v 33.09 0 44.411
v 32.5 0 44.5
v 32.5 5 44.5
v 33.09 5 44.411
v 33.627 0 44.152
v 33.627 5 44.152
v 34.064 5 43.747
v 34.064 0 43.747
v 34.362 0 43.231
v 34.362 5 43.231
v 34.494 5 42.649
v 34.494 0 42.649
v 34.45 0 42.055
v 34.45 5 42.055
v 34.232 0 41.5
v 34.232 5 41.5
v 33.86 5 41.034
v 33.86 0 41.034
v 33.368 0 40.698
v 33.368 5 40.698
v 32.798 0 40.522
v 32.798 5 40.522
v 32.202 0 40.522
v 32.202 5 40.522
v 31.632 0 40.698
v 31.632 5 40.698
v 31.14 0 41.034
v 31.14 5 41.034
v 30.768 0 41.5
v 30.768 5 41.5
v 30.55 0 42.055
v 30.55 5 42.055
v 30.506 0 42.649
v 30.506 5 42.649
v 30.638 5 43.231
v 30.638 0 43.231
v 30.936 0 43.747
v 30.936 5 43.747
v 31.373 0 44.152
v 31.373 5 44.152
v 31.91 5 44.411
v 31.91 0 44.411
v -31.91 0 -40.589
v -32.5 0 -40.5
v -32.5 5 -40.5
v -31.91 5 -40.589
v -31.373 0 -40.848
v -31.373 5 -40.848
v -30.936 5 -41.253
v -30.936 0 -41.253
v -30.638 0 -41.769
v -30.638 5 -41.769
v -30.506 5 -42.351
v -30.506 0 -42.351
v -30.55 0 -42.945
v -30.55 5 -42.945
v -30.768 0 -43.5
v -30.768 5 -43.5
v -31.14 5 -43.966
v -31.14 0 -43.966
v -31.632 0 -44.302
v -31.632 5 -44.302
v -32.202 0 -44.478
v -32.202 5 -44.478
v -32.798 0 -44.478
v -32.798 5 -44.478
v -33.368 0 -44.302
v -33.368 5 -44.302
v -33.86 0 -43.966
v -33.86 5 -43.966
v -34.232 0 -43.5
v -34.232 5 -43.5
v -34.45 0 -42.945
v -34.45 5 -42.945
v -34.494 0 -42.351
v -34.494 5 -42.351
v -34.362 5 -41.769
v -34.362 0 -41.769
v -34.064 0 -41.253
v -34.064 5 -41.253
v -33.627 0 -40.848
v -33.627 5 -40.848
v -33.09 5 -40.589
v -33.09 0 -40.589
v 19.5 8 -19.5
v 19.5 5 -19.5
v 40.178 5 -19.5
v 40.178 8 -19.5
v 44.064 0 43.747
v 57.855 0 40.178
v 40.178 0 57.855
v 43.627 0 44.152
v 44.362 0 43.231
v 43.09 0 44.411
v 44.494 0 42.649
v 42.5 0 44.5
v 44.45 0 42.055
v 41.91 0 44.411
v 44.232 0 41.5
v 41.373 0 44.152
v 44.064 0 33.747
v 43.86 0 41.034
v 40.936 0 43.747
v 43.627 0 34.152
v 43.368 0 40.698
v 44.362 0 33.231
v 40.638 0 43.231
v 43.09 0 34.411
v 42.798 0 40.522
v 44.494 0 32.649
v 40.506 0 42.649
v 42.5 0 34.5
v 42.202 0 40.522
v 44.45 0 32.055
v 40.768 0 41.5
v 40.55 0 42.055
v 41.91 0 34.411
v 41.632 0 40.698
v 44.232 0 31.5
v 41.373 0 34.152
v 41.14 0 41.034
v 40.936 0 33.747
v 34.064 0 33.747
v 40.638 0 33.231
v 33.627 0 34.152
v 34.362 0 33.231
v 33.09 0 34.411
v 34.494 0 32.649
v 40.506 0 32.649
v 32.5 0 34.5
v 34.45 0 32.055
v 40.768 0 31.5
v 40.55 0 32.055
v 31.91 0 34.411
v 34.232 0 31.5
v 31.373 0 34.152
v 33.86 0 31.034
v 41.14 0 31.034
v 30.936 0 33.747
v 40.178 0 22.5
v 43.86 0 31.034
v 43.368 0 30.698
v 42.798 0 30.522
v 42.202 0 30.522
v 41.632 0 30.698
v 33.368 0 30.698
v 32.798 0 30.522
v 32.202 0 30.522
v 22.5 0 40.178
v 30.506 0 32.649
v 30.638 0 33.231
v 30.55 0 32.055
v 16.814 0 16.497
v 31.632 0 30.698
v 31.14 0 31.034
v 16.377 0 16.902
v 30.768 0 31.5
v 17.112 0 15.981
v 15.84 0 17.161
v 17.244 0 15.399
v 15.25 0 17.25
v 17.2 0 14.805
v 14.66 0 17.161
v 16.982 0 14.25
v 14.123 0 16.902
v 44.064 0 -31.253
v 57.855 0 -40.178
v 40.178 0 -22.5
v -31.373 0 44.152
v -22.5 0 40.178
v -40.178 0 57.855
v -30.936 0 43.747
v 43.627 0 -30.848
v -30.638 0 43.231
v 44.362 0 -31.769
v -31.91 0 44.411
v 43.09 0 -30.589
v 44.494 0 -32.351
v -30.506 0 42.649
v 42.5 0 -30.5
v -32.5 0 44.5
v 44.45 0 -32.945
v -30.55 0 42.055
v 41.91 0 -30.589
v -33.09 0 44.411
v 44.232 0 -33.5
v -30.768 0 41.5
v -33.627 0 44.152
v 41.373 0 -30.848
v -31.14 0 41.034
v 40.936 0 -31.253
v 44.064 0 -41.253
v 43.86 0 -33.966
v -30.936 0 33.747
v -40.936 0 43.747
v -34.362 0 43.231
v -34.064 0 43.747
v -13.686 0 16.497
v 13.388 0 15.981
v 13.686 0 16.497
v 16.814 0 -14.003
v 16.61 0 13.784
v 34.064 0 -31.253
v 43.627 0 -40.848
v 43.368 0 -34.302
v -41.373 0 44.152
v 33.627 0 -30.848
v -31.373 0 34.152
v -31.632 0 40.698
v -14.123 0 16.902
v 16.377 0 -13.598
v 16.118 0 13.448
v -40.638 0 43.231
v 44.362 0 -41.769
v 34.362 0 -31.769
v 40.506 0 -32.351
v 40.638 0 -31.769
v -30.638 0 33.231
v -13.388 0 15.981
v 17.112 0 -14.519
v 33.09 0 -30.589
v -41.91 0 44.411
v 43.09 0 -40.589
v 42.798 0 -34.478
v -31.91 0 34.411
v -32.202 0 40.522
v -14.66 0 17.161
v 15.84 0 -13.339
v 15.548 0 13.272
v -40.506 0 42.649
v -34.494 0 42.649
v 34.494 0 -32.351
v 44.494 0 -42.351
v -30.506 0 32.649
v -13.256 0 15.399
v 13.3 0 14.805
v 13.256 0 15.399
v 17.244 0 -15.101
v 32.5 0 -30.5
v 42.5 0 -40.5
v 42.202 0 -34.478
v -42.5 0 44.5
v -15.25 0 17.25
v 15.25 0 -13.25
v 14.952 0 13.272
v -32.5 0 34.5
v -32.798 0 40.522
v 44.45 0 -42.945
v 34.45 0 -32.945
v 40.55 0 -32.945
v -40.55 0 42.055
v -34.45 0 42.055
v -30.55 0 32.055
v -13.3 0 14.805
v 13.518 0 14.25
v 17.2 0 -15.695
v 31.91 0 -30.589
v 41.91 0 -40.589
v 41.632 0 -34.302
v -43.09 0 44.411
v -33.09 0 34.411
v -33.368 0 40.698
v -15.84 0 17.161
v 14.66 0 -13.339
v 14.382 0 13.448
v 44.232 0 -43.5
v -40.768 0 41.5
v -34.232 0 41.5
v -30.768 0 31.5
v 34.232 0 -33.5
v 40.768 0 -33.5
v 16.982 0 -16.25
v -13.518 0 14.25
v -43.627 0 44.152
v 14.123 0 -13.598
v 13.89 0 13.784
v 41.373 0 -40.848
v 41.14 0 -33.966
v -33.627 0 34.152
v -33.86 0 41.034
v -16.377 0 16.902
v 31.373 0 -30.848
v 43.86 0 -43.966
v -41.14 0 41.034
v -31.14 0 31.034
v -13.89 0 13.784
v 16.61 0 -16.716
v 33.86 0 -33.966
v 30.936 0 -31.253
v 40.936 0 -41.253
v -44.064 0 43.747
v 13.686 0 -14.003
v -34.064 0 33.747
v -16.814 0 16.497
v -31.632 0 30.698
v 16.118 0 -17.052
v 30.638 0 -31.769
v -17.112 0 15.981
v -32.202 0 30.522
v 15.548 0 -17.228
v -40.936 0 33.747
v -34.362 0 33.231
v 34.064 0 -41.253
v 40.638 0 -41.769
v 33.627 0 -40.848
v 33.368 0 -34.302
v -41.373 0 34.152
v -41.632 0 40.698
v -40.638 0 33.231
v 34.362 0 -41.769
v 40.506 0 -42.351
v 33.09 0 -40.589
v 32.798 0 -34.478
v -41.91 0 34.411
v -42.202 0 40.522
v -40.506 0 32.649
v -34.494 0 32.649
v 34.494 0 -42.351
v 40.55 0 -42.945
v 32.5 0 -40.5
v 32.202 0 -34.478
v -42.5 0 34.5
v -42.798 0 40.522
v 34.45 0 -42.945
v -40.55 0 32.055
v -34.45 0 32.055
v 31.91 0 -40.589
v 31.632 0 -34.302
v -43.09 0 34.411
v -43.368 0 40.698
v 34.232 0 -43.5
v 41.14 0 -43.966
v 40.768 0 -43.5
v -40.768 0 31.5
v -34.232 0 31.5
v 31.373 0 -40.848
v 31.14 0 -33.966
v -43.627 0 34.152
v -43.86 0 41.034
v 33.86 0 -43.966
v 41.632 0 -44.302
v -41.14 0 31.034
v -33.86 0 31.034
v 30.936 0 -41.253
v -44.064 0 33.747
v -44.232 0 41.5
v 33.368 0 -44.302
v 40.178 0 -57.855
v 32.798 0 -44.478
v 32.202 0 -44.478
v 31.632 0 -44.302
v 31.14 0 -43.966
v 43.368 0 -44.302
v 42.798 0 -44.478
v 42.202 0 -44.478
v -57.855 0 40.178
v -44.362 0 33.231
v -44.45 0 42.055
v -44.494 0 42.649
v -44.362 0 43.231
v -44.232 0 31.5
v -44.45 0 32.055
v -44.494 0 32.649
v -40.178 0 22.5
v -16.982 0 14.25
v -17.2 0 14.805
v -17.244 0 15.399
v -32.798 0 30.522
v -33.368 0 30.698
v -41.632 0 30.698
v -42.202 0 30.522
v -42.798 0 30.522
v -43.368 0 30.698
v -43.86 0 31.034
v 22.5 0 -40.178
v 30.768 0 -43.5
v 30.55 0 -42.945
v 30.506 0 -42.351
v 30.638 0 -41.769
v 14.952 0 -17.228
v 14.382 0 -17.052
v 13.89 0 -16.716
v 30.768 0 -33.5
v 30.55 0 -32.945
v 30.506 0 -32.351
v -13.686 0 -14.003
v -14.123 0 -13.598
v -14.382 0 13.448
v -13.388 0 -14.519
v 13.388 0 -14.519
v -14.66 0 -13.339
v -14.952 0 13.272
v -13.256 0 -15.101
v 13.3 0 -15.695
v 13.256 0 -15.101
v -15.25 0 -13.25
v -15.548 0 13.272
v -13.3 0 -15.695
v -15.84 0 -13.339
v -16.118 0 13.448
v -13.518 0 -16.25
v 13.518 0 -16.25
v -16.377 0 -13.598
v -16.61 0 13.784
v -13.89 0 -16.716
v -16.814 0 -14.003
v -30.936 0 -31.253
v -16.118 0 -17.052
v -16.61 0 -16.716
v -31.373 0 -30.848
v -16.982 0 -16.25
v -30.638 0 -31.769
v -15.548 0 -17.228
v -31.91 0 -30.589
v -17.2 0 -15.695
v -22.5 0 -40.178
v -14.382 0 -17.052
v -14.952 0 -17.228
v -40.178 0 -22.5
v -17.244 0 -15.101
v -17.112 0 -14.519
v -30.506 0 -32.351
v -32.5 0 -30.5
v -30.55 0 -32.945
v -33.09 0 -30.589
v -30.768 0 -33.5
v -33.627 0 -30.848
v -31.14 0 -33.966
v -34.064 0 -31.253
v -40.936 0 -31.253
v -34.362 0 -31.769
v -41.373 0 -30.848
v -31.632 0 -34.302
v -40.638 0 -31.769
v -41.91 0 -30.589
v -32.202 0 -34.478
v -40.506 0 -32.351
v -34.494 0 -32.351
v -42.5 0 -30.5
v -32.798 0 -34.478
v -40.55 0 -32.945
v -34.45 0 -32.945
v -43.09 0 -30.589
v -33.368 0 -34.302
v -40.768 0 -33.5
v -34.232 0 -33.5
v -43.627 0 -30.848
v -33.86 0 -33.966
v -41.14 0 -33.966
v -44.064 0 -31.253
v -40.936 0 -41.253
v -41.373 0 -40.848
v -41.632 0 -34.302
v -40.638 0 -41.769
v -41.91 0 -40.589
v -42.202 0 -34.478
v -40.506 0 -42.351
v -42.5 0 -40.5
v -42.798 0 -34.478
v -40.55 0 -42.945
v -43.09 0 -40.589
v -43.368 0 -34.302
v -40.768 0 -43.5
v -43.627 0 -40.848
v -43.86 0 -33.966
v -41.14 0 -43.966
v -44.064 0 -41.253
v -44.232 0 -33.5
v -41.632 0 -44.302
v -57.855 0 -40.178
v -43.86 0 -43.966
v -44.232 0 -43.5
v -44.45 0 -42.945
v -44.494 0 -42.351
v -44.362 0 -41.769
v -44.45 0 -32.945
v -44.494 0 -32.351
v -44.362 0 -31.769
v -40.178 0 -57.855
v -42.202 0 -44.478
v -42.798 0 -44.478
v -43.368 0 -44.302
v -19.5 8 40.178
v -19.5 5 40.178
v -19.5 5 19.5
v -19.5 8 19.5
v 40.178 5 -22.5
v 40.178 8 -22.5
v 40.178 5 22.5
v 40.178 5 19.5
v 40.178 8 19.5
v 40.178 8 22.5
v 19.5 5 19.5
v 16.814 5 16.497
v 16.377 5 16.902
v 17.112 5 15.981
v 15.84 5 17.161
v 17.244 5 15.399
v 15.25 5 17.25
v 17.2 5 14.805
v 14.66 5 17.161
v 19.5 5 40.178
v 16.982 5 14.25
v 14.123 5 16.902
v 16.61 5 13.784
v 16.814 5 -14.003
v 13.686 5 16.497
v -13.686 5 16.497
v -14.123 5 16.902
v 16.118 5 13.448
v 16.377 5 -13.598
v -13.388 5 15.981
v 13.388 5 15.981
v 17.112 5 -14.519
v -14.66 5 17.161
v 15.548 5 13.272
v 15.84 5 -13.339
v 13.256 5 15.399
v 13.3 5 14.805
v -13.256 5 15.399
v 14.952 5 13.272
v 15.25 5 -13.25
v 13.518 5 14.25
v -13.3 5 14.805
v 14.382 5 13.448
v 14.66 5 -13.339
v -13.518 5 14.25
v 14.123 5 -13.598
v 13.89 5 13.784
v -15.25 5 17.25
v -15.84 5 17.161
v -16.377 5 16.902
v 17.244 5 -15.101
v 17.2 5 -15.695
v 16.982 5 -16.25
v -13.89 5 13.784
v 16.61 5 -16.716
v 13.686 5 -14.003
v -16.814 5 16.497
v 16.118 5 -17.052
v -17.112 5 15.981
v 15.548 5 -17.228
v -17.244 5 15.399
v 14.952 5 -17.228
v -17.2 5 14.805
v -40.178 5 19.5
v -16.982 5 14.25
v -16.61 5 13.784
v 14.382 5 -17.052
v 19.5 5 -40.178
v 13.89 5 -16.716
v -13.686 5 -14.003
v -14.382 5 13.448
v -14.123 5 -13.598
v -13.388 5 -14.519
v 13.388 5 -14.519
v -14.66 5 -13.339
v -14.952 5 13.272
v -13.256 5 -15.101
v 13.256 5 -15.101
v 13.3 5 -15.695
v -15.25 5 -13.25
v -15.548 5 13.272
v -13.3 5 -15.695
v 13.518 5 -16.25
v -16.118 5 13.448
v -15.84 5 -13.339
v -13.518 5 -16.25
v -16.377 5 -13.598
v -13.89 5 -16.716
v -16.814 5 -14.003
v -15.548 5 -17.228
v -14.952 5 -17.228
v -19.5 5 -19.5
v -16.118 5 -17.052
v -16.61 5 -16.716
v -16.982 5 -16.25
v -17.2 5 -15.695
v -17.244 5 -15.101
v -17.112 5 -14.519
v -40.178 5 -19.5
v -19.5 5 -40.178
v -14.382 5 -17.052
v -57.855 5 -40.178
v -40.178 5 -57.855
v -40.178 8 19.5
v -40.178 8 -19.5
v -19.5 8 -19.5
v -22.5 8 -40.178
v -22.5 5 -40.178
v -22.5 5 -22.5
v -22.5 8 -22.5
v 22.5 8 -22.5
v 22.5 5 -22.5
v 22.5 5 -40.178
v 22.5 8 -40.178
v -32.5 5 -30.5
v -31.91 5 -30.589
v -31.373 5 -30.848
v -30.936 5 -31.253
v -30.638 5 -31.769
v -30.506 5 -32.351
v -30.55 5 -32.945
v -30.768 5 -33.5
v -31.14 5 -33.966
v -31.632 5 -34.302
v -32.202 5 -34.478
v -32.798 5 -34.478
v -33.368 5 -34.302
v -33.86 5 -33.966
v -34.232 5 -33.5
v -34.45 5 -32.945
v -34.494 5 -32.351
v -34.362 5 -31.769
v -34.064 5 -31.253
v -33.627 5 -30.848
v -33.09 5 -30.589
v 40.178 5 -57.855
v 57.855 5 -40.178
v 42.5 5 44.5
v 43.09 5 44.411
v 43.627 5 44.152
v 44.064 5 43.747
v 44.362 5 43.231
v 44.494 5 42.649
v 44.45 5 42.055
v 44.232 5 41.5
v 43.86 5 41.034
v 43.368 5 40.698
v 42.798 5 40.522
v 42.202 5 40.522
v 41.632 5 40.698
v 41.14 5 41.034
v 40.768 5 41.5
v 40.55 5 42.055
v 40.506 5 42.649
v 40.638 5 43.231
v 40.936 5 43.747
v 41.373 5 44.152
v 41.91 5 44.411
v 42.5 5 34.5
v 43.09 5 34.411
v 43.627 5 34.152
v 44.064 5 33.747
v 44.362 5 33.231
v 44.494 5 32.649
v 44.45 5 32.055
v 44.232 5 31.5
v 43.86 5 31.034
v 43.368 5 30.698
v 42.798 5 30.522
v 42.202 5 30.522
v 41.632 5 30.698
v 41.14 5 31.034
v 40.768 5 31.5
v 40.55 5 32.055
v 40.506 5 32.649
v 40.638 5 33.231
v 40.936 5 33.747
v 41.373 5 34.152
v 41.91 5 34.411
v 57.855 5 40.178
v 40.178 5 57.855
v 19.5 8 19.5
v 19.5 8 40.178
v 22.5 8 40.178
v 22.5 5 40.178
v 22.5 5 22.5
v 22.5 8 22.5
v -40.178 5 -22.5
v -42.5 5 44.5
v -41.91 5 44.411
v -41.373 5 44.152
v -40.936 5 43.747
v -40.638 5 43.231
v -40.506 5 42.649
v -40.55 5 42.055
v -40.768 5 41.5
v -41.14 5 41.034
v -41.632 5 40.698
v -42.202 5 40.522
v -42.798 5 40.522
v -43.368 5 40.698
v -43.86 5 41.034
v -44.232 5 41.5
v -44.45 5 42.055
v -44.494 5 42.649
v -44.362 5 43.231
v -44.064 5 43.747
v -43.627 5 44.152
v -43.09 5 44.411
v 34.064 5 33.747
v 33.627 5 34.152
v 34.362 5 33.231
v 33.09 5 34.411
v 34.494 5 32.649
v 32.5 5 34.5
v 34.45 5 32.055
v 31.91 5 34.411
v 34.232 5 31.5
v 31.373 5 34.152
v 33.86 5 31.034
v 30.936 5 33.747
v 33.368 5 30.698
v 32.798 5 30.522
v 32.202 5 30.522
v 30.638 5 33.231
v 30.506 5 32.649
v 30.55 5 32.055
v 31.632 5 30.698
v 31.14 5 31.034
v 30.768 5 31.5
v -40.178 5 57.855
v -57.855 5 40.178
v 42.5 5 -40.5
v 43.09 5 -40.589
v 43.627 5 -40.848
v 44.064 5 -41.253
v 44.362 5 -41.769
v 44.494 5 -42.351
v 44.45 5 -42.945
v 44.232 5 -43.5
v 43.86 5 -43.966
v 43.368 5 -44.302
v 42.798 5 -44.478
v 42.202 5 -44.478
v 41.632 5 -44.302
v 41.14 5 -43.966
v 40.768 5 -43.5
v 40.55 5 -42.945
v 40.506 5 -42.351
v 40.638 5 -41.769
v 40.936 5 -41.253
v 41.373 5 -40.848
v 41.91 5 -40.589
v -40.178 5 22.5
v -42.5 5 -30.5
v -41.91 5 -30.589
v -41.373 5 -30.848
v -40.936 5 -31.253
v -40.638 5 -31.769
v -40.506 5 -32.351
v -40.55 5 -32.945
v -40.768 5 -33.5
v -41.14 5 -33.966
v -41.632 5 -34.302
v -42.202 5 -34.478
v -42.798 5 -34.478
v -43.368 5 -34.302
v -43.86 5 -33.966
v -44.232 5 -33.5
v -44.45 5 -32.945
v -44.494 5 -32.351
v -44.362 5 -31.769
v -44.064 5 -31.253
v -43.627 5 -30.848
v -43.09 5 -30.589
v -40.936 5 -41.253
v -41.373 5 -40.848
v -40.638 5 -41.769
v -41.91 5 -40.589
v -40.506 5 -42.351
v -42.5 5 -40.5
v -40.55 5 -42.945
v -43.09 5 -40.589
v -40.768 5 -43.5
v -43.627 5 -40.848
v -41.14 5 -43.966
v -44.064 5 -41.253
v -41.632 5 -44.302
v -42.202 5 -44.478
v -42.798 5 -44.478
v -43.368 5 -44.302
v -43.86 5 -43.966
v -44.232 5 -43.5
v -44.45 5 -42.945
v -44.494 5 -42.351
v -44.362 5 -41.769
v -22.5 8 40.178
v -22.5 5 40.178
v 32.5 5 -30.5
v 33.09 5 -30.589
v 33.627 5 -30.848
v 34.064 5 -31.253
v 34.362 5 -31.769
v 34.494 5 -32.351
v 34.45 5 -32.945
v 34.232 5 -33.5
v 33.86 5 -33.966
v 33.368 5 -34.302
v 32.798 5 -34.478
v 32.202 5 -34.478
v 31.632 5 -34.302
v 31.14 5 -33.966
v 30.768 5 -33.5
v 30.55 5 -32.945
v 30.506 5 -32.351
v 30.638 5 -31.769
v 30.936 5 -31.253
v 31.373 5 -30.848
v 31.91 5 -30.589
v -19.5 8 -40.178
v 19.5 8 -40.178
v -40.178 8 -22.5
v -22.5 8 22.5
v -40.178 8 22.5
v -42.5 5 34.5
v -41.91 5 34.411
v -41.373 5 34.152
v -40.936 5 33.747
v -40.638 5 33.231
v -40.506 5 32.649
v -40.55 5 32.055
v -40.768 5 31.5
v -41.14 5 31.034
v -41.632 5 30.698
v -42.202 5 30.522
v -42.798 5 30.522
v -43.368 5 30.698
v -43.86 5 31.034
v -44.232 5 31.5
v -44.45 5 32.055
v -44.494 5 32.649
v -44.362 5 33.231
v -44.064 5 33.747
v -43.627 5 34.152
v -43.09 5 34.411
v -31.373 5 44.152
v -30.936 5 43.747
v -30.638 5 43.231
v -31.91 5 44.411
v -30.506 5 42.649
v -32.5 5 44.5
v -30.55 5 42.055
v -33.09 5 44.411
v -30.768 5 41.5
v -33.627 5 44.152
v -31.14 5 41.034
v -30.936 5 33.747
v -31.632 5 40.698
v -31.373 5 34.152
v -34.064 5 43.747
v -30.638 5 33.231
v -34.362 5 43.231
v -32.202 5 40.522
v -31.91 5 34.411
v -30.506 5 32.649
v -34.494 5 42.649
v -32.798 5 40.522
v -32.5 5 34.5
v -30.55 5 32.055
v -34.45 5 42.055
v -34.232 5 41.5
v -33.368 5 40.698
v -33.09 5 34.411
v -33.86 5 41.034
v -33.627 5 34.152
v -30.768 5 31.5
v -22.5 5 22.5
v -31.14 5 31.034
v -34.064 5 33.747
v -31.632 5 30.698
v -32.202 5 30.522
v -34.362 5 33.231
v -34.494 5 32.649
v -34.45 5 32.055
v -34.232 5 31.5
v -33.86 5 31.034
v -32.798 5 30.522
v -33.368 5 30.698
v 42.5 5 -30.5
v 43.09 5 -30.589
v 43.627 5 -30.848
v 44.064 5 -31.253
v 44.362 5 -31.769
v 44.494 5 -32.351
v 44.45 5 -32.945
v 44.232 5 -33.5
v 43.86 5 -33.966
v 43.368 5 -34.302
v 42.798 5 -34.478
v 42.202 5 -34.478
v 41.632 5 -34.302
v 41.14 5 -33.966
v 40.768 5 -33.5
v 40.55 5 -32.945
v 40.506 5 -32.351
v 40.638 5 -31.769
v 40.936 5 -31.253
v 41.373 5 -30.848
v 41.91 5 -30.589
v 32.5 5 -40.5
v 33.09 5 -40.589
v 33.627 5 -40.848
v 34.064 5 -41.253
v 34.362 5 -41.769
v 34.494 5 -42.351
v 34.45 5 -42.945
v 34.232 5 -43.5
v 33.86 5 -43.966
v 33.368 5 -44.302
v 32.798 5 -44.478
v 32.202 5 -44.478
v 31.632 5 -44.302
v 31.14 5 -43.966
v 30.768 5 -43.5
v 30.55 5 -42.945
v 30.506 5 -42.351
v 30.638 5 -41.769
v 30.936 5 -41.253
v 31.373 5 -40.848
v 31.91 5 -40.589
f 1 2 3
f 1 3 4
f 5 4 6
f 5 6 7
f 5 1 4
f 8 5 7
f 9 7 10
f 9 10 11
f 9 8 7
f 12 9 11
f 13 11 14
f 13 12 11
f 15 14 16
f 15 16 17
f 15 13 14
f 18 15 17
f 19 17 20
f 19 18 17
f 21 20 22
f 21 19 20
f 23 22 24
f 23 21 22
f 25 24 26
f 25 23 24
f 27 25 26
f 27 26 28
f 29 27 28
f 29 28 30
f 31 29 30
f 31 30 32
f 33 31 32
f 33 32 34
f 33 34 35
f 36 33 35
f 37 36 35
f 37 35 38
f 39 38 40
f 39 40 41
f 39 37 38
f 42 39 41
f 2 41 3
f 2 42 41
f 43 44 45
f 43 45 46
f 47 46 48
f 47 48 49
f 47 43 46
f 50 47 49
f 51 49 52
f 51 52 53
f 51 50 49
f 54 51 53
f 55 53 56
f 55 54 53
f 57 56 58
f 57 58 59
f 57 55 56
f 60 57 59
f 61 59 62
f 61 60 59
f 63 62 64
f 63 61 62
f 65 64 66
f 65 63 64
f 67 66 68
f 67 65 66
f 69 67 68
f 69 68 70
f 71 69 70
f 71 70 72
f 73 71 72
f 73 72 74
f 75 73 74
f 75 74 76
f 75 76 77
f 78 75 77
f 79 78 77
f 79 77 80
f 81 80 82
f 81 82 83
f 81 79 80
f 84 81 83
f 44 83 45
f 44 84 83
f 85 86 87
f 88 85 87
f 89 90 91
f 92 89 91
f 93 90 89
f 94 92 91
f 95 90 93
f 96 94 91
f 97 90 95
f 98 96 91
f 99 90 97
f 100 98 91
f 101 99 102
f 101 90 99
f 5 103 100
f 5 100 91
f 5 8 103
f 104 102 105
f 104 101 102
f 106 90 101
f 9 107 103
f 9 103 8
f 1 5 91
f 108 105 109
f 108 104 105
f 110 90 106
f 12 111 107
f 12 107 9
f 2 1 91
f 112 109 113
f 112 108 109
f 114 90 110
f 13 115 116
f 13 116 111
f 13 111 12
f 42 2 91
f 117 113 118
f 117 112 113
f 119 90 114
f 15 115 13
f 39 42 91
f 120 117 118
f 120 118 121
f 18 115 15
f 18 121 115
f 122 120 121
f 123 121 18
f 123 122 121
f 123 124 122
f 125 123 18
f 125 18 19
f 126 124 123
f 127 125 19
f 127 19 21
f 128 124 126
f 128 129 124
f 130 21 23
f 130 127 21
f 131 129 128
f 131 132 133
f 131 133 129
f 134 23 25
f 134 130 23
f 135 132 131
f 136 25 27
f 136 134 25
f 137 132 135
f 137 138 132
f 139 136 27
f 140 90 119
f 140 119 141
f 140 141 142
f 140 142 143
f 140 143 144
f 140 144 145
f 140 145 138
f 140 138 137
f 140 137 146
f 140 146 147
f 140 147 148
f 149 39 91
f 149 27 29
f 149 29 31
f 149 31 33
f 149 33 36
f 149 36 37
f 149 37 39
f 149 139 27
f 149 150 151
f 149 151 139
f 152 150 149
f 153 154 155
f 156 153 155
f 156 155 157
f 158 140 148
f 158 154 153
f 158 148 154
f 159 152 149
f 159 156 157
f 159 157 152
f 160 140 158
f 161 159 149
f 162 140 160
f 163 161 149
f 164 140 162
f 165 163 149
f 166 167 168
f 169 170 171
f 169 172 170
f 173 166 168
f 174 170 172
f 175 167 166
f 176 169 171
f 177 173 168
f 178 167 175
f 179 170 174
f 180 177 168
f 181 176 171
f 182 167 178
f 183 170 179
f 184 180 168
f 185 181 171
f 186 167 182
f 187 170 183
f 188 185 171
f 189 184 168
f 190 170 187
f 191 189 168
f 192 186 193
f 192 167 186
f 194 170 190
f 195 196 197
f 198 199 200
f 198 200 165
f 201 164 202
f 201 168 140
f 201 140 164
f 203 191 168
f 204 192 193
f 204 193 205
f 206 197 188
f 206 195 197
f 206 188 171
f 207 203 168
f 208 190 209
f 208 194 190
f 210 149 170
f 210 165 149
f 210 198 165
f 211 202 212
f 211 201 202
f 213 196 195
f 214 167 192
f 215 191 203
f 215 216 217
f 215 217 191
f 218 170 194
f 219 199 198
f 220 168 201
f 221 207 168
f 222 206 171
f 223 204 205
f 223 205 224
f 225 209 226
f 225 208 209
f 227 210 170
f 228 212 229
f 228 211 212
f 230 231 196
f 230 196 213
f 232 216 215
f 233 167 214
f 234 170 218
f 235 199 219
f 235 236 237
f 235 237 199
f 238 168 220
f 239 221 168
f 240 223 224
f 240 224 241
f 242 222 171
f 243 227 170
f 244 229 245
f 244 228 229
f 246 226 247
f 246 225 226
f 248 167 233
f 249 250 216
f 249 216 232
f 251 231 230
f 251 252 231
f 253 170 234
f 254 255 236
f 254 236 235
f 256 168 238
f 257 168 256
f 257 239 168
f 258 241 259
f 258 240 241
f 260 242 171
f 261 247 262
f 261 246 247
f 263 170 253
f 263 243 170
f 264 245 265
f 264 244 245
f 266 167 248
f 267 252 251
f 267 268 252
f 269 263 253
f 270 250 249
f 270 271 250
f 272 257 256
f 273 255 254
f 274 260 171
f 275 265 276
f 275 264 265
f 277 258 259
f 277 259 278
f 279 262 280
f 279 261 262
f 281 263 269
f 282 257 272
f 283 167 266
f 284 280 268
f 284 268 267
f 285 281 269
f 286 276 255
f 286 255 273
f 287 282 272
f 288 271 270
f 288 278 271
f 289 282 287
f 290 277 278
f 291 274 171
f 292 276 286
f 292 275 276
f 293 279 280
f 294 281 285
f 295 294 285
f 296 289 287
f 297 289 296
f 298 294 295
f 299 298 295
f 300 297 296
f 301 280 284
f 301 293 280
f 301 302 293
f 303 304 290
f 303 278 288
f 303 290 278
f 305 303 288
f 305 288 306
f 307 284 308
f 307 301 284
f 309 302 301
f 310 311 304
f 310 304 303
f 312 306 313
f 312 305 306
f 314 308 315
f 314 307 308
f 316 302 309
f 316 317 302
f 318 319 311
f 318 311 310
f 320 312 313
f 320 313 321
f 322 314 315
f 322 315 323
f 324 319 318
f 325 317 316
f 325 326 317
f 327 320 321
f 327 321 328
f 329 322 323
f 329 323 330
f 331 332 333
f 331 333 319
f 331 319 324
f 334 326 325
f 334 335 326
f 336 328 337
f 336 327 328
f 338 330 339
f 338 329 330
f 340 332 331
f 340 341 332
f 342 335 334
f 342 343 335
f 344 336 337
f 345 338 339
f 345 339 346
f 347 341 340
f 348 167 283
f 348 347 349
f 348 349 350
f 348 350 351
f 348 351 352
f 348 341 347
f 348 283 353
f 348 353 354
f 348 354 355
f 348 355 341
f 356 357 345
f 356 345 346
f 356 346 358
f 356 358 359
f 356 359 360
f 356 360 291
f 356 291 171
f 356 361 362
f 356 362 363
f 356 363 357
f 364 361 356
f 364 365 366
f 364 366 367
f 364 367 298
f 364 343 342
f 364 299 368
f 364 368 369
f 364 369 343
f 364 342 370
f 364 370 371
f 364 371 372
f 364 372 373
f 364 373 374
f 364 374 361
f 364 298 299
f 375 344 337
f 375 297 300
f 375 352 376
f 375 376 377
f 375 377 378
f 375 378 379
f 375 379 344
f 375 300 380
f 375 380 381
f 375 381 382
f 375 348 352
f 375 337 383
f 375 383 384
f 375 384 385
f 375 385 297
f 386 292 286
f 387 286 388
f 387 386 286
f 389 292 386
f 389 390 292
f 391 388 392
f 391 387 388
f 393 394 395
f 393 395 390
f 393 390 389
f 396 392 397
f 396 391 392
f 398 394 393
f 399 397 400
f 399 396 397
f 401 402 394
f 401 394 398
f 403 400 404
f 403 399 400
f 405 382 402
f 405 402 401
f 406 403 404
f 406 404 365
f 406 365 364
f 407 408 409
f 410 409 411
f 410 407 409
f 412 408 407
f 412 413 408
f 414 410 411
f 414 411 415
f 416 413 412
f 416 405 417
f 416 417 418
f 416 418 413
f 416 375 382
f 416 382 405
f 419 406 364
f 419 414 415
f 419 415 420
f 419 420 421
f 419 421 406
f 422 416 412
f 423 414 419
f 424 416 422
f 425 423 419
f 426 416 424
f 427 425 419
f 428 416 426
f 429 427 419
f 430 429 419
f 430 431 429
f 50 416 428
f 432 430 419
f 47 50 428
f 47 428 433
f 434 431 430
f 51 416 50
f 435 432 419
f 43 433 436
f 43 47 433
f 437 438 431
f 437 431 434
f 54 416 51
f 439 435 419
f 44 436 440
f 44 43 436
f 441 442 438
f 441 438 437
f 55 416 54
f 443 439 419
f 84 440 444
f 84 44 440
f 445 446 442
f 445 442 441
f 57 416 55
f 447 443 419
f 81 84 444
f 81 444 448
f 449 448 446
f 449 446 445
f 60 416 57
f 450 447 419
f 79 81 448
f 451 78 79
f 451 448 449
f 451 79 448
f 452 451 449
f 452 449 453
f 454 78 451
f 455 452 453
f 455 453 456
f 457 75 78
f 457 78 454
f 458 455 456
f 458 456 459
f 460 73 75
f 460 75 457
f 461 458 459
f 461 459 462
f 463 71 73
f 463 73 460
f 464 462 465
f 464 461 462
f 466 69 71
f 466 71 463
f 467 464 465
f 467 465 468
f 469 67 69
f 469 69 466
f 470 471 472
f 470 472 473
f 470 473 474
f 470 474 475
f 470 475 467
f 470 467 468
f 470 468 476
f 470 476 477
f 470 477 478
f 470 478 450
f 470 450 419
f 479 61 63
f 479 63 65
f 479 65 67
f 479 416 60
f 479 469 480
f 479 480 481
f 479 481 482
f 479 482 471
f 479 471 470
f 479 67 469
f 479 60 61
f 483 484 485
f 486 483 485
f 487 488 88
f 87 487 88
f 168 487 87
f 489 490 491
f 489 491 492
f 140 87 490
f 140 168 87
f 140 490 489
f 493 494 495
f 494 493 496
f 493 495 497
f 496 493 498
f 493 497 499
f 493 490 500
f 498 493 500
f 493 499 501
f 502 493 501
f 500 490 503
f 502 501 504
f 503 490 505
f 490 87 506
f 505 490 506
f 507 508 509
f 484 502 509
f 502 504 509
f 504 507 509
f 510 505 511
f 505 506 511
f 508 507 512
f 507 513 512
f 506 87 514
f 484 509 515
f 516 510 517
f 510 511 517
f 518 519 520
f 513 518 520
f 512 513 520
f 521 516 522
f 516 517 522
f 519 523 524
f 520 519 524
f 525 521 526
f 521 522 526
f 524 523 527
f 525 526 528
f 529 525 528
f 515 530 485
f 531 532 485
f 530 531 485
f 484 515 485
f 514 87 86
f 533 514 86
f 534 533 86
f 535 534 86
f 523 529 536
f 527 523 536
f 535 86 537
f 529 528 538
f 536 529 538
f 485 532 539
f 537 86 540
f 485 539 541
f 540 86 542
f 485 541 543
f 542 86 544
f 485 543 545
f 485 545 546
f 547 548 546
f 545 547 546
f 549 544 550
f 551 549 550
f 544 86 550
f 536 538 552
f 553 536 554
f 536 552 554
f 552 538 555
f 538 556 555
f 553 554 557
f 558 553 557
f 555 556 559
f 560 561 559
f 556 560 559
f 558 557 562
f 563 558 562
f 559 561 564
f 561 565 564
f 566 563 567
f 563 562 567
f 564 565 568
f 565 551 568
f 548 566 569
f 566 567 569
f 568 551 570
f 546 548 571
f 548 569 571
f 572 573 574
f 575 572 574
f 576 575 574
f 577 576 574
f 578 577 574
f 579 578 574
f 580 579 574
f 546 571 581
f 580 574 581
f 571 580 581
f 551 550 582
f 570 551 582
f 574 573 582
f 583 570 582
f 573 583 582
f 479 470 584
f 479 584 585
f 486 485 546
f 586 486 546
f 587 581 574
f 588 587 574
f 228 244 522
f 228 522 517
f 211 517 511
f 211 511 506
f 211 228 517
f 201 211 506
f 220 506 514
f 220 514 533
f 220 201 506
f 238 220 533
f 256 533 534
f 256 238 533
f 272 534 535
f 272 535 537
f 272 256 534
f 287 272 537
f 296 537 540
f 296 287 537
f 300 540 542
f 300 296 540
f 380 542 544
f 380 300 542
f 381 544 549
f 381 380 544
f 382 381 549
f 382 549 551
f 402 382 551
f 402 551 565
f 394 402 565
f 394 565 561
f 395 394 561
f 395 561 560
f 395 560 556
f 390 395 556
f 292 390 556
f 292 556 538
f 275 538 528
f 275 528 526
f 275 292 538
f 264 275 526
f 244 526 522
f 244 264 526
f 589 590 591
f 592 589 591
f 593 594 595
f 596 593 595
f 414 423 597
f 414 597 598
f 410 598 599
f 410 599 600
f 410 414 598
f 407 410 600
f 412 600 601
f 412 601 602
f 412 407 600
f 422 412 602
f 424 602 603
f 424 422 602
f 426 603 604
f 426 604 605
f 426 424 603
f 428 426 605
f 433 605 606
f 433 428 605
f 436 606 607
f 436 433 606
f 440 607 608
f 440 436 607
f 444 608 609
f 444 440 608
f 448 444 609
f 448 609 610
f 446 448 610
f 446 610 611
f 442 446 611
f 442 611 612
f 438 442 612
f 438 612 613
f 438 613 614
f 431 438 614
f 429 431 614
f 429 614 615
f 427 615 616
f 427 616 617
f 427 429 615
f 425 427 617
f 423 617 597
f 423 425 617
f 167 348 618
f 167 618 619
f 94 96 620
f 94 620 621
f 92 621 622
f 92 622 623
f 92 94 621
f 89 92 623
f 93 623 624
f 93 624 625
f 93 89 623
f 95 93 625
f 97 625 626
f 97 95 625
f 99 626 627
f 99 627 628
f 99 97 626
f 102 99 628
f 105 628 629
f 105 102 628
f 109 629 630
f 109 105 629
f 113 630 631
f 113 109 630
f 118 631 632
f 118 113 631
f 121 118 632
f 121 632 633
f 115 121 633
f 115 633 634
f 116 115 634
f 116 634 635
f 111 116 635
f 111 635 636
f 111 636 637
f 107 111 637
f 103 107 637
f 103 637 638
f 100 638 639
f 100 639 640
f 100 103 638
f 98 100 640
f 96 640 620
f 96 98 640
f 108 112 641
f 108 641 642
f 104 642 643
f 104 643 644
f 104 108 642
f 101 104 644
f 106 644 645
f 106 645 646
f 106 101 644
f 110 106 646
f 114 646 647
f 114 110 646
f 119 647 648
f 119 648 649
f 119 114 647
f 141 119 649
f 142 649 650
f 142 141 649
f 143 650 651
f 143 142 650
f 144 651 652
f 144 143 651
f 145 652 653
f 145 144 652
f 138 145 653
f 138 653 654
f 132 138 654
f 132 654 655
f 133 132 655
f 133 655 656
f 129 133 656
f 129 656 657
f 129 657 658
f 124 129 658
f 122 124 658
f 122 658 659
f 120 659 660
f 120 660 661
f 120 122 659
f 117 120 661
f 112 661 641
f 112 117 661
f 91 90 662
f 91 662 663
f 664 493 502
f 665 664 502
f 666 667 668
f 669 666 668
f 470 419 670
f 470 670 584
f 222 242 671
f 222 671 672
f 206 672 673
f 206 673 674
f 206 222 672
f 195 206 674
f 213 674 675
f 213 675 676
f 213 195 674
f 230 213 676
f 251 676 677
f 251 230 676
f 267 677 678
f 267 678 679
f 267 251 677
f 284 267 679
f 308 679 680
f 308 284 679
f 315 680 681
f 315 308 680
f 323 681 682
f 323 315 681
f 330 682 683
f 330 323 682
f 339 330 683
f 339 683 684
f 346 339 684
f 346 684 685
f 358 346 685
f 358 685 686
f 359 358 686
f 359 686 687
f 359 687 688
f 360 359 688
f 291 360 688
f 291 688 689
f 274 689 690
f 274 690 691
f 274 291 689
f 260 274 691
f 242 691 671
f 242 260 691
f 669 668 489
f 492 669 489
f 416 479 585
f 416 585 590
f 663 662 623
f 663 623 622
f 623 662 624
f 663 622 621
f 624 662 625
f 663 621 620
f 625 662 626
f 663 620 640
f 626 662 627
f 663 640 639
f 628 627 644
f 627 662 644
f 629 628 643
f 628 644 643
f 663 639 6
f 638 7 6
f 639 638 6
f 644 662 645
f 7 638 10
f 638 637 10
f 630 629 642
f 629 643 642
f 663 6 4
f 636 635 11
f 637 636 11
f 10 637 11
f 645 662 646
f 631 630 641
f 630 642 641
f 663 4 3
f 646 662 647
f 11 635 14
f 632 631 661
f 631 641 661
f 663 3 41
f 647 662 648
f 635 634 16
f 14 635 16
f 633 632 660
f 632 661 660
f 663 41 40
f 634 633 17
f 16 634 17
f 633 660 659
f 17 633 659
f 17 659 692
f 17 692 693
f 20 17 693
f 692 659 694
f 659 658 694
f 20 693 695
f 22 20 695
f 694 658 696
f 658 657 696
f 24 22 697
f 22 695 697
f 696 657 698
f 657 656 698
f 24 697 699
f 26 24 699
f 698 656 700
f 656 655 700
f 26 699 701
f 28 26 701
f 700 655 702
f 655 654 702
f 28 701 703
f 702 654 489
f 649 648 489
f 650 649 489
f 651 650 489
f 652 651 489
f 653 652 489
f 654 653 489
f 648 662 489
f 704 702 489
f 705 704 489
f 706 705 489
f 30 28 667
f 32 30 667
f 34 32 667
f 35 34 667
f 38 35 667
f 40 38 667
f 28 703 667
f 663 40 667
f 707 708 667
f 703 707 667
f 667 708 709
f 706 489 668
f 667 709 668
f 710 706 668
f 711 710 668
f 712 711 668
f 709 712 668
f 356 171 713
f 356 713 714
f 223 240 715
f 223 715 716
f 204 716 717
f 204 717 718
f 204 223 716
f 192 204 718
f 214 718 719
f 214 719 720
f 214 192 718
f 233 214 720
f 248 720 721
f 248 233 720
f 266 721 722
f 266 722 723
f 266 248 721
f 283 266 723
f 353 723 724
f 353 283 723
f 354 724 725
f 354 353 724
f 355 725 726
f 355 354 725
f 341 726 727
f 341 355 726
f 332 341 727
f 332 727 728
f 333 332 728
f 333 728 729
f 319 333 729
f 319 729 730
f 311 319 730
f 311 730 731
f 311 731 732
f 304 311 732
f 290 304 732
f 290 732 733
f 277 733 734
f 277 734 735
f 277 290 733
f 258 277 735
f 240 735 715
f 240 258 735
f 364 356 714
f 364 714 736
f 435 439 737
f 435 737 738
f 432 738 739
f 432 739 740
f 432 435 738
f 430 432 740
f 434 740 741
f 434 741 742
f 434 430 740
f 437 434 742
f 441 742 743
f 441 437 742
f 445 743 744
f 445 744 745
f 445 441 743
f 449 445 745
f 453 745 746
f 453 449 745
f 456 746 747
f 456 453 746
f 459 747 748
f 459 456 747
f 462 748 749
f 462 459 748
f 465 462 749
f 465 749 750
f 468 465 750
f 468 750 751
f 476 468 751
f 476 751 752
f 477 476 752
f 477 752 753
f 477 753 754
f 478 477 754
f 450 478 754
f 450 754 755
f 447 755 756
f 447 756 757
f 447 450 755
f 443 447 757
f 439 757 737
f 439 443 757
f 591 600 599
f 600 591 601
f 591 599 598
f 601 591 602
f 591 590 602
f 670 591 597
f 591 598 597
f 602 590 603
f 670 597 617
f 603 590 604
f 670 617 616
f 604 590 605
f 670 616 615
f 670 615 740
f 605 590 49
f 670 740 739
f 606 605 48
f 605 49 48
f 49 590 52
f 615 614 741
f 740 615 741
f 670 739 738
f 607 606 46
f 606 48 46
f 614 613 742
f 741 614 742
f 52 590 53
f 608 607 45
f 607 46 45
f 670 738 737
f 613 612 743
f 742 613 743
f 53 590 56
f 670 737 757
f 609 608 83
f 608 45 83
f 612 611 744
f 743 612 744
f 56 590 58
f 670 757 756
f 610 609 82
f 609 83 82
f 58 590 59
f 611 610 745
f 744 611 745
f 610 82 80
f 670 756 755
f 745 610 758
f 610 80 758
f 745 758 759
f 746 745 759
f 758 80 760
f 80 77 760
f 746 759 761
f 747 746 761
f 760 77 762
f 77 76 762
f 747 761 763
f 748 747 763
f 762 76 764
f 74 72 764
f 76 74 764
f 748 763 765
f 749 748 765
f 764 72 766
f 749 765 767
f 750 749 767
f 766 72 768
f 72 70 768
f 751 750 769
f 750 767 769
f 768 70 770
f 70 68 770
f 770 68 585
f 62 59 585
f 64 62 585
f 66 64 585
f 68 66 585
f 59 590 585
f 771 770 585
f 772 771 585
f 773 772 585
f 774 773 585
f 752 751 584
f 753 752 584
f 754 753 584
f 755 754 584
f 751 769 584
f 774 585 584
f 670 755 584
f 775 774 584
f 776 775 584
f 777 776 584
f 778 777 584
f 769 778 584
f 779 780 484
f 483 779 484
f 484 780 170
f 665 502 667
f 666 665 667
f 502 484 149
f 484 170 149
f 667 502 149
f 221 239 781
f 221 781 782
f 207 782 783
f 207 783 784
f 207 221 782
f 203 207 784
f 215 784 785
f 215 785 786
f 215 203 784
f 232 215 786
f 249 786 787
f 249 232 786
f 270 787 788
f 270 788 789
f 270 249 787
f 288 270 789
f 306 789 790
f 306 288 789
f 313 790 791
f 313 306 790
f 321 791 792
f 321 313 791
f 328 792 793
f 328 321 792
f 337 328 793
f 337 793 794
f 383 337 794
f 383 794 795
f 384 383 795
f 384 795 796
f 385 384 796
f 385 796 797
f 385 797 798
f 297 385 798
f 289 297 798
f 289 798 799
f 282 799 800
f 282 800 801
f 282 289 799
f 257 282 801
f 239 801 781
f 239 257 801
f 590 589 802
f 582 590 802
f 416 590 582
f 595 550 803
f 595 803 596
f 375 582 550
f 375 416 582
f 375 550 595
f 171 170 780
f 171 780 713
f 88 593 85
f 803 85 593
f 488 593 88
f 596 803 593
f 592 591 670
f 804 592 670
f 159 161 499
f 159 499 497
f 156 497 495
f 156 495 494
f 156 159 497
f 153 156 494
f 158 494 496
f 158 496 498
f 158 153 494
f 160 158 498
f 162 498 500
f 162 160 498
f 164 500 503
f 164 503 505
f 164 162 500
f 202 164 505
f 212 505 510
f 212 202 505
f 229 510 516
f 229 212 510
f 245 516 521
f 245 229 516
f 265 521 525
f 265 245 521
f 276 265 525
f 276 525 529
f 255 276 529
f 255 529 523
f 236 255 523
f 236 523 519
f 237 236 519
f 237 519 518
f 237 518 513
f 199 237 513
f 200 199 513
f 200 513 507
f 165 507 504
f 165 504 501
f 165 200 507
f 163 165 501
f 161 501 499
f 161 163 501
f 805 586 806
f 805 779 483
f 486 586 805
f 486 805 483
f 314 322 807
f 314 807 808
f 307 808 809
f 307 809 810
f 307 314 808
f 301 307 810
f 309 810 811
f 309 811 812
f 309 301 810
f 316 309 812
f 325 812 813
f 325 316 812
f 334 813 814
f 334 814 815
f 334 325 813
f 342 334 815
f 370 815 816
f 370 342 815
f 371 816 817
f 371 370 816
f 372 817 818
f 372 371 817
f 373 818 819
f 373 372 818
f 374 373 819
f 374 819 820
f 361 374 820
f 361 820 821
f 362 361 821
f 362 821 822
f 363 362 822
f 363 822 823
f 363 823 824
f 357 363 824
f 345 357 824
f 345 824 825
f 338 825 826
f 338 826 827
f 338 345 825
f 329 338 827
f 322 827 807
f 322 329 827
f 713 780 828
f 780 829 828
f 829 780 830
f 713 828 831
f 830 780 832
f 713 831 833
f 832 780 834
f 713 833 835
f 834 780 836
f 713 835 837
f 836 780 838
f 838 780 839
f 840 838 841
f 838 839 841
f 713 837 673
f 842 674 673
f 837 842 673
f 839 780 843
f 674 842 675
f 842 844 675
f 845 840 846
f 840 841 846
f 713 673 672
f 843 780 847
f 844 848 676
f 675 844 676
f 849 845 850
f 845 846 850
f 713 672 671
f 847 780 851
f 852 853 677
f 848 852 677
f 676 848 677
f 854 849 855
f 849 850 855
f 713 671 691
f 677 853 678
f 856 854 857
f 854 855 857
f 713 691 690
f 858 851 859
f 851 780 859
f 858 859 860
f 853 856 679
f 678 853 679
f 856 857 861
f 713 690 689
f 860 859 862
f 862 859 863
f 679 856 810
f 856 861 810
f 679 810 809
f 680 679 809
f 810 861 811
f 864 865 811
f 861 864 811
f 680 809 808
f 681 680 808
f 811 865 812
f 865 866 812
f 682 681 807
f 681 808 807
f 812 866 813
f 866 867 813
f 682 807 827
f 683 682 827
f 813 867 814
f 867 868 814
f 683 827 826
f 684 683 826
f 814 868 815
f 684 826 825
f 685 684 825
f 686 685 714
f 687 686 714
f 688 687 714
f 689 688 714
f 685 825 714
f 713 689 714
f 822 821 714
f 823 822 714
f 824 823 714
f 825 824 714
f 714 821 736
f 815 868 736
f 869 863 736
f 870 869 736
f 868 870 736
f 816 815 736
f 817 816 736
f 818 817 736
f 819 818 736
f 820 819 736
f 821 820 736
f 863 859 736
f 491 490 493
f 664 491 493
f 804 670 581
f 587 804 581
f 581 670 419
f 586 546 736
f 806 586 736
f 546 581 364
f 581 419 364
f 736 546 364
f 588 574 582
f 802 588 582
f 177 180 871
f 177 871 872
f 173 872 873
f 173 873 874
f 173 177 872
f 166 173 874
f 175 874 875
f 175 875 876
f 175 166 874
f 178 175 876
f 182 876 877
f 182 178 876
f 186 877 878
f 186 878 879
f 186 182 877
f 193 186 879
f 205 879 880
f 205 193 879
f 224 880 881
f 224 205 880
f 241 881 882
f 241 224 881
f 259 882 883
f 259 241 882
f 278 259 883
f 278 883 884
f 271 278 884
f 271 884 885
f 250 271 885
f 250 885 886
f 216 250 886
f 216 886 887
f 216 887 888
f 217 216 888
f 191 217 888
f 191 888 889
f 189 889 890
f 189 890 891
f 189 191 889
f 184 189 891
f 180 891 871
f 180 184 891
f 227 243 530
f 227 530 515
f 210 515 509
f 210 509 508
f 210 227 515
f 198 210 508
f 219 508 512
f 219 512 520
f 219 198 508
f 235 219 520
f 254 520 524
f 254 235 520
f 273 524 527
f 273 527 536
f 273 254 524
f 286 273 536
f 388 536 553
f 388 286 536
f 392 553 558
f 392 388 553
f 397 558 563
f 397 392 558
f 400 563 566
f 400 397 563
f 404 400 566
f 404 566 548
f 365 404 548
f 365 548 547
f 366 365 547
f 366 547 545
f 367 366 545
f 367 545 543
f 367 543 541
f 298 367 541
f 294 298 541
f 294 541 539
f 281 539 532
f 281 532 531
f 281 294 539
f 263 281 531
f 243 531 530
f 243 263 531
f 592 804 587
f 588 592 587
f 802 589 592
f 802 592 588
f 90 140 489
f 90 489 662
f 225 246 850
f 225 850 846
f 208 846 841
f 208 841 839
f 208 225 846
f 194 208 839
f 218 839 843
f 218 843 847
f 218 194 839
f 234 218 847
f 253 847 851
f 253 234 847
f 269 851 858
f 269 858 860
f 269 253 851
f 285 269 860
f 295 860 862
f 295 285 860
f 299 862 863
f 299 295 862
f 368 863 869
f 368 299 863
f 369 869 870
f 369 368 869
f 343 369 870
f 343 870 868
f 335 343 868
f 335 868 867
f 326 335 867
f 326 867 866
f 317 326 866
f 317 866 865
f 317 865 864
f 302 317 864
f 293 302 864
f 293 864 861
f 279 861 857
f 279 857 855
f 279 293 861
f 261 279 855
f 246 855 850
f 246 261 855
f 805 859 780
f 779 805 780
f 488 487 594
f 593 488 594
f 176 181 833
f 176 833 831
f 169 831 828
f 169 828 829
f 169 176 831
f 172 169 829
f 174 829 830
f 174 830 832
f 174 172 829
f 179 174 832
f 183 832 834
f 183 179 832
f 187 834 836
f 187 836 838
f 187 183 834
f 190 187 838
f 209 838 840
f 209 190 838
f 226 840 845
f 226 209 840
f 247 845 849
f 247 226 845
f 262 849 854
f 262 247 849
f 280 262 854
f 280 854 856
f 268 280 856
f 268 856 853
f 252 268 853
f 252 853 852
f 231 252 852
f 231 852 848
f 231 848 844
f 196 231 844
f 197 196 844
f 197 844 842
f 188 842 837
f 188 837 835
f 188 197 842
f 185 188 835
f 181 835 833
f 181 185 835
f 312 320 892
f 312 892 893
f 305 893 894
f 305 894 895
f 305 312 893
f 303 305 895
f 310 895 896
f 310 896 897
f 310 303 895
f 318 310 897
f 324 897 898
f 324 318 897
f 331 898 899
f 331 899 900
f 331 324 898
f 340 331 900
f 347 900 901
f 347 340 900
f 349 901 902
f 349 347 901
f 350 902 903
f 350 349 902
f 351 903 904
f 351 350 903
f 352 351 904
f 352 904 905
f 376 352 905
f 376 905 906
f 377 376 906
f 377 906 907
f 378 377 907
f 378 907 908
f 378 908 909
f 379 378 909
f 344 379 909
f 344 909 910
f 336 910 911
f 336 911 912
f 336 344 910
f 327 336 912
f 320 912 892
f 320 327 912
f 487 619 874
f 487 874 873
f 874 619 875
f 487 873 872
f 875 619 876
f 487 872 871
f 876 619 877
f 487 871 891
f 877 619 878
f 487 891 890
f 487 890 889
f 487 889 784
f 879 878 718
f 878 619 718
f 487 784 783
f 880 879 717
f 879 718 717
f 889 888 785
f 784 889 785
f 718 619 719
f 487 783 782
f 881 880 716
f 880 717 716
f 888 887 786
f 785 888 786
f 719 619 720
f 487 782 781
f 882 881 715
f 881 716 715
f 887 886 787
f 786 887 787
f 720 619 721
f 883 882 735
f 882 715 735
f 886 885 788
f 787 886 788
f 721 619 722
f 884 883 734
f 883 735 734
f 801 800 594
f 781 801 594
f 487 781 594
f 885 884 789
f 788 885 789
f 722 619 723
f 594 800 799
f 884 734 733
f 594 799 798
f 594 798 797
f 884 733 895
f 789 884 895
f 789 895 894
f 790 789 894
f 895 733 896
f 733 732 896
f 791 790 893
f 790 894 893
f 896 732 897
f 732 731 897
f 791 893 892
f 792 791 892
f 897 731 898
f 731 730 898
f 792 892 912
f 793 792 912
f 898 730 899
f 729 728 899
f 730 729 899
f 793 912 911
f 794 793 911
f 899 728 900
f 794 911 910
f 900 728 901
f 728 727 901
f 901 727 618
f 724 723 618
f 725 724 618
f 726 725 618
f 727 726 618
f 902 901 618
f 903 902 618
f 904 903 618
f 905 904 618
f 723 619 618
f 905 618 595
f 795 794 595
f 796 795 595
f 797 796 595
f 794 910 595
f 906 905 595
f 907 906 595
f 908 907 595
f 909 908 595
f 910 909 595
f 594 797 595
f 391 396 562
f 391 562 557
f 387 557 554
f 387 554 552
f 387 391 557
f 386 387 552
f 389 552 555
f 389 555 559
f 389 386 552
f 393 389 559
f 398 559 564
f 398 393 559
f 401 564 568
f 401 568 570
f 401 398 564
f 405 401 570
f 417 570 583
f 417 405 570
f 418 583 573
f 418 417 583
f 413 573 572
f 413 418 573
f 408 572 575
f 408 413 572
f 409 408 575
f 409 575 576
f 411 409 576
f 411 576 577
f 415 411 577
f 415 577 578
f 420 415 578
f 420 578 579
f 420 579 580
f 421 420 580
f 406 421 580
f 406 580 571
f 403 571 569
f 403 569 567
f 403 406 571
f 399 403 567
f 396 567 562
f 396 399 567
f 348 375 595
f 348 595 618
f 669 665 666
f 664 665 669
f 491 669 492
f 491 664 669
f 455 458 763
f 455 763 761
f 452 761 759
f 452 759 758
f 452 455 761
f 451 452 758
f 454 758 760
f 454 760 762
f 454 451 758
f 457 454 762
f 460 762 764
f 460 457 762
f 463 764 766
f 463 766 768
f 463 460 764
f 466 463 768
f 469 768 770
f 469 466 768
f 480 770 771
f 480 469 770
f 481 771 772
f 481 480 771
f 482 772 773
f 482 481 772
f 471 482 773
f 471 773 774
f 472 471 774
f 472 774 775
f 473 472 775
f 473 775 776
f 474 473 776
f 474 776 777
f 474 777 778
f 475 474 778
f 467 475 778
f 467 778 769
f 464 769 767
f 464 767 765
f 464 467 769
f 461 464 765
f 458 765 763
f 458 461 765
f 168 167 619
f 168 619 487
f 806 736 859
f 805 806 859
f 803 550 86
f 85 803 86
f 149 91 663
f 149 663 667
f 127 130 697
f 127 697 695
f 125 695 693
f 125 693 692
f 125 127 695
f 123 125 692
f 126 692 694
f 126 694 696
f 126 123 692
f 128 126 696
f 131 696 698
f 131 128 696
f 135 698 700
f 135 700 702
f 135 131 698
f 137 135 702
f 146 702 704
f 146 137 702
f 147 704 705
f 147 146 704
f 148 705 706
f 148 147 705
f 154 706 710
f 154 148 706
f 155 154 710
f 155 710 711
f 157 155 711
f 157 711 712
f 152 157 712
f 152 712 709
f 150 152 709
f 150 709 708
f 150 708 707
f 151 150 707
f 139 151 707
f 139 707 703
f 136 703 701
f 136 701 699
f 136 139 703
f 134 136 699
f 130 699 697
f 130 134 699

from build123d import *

# Parameters (mm, degrees)
EXTRUDE_1_DEPTH     = 5
EXTRUDE_2_DEPTH     = 3
SKETCH_4_R          = 2
CUT_EXTRUDE_1_DEPTH = 5
SKETCH_6_R          = 2
CUT_EXTRUDE_2_DEPTH = 5


with BuildPart() as part:
    # 스케치1 → 보스-돌출1 (new body)
    with BuildSketch(Plane(origin=(0, 0, 0), x_dir=(1, 0, 0), z_dir=(0, 1, 0))):
        Polygon((-40.17766953, 22.5), (-57.855339059, 40.17766953), (-40.17766953, 57.855339059), (-22.5, 40.17766953), align=None)
        Polygon((-22.5, 40.17766953), (22.5, -40.17766953), (-22.5, -40.17766953), (-40.17766953, -22.5), (-40.17766953, 22.5), align=None)
        Polygon((-40.17766953, -57.855339059), (-57.855339059, -40.17766953), (-40.17766953, -22.5), (-22.5, -40.17766953), align=None)
        Polygon((-22.5, 40.17766953), (22.5, 40.17766953), (40.17766953, 22.5), (40.17766953, -22.5), (22.5, -40.17766953), align=None)
        Polygon((40.17766953, -57.855339059), (22.5, -40.17766953), (40.17766953, -22.5), (57.855339059, -40.17766953), align=None)
        Polygon((40.17766953, 22.5), (22.5, 40.17766953), (40.17766953, 57.855339059), (57.855339059, 40.17766953), align=None)
    extrude(amount=EXTRUDE_1_DEPTH)

    # 스케치2 → 보스-돌출2 (add)
    with BuildSketch(Plane(origin=(0, 5, 0), x_dir=(1, 0, 0), z_dir=(0, 1, 0))):
        Polygon((-40.17766953, -19.5), (-40.17766953, -22.5), (-22.5, -22.5), (-22.5, -40.17766953), (-19.5, -40.17766953), (-19.5, -19.5), align=None)
        Polygon((-19.5, 40.17766953), (-22.5, 40.17766953), (-22.5, 22.5), (-40.17766953, 22.5), (-40.17766953, 19.5), (-19.5, 19.5), align=None)
        Polygon((40.17766953, 19.5), (40.17766953, 22.5), (22.5, 22.5), (22.5, 40.17766953), (19.5, 40.17766953), (19.5, 19.5), align=None)
        Polygon((19.5, -40.17766953), (22.5, -40.17766953), (22.5, -22.5), (40.17766953, -22.5), (40.17766953, -19.5), (19.5, -19.5), align=None)
    extrude(amount=EXTRUDE_2_DEPTH)

    # 스케치4 → 컷-돌출1 (cut)
    with BuildSketch(Plane(origin=(0, 0, 0), x_dir=(1, 0, 0), z_dir=(0, 1, 0))):
        with Locations(Location((-42.5, -42.5, 0), (0, 0, 270))):
            Circle(SKETCH_4_R)
        with Locations(Location((-32.5, -42.5, 0), (0, 0, 270))):
            Circle(SKETCH_4_R)
        with Locations(Location((-42.5, -32.5, 0), (0, 0, 270))):
            Circle(SKETCH_4_R)
        with Locations(Location((-32.5, -32.5, 0), (0, 0, 270))):
            Circle(SKETCH_4_R)
        with Locations(Location((-32.5, 32.5, 0), (0, 0, 270))):
            Circle(SKETCH_4_R)
        with Locations(Location((-42.5, 32.5, 0), (0, 0, 270))):
            Circle(SKETCH_4_R)
        with Locations(Location((-42.5, 42.5, 0), (0, 0, 270))):
            Circle(SKETCH_4_R)
        with Locations(Location((-32.5, 42.5, 0), (0, 0, 270))):
            Circle(SKETCH_4_R)
        with Locations(Location((32.5, 32.5, 0), (0, 0, 270))):
            Circle(SKETCH_4_R)
        with Locations(Location((32.5, 42.5, 0), (0, 0, 270))):
            Circle(SKETCH_4_R)
        with Locations(Location((42.5, 42.5, 0), (0, 0, 270))):
            Circle(SKETCH_4_R)
        with Locations(Location((42.5, 32.5, 0), (0, 0, 270))):
            Circle(SKETCH_4_R)
        with Locations(Location((32.5, -32.5, 0), (0, 0, 270))):
            Circle(SKETCH_4_R)
        with Locations(Location((42.5, -32.5, 0), (0, 0, 270))):
            Circle(SKETCH_4_R)
        with Locations(Location((42.5, -42.5, 0), (0, 0, 270))):
            Circle(SKETCH_4_R)
        with Locations(Location((32.5, -42.5, 0), (0, 0, 270))):
            Circle(SKETCH_4_R)
    extrude(amount=CUT_EXTRUDE_1_DEPTH, mode=Mode.SUBTRACT)

    # 스케치6 → 컷-돌출2 (cut)
    with BuildSketch(Plane(origin=(0, 0, 0), x_dir=(1, 0, 0), z_dir=(0, 1, 0))):
        with Locations(Location((-15.25, 15.25, 0), (0, 0, 270))):
            Circle(SKETCH_6_R)
        with Locations(Location((15.25, -15.25, 0), (0, 0, 270))):
            Circle(SKETCH_6_R)
        with Locations(Location((15.25, 15.25, 0), (0, 0, 270))):
            Circle(SKETCH_6_R)
        with Locations(Location((-15.25, -15.25, 0), (0, 0, 270))):
            Circle(SKETCH_6_R)
    extrude(amount=CUT_EXTRUDE_2_DEPTH, mode=Mode.SUBTRACT)


solid = part.part
